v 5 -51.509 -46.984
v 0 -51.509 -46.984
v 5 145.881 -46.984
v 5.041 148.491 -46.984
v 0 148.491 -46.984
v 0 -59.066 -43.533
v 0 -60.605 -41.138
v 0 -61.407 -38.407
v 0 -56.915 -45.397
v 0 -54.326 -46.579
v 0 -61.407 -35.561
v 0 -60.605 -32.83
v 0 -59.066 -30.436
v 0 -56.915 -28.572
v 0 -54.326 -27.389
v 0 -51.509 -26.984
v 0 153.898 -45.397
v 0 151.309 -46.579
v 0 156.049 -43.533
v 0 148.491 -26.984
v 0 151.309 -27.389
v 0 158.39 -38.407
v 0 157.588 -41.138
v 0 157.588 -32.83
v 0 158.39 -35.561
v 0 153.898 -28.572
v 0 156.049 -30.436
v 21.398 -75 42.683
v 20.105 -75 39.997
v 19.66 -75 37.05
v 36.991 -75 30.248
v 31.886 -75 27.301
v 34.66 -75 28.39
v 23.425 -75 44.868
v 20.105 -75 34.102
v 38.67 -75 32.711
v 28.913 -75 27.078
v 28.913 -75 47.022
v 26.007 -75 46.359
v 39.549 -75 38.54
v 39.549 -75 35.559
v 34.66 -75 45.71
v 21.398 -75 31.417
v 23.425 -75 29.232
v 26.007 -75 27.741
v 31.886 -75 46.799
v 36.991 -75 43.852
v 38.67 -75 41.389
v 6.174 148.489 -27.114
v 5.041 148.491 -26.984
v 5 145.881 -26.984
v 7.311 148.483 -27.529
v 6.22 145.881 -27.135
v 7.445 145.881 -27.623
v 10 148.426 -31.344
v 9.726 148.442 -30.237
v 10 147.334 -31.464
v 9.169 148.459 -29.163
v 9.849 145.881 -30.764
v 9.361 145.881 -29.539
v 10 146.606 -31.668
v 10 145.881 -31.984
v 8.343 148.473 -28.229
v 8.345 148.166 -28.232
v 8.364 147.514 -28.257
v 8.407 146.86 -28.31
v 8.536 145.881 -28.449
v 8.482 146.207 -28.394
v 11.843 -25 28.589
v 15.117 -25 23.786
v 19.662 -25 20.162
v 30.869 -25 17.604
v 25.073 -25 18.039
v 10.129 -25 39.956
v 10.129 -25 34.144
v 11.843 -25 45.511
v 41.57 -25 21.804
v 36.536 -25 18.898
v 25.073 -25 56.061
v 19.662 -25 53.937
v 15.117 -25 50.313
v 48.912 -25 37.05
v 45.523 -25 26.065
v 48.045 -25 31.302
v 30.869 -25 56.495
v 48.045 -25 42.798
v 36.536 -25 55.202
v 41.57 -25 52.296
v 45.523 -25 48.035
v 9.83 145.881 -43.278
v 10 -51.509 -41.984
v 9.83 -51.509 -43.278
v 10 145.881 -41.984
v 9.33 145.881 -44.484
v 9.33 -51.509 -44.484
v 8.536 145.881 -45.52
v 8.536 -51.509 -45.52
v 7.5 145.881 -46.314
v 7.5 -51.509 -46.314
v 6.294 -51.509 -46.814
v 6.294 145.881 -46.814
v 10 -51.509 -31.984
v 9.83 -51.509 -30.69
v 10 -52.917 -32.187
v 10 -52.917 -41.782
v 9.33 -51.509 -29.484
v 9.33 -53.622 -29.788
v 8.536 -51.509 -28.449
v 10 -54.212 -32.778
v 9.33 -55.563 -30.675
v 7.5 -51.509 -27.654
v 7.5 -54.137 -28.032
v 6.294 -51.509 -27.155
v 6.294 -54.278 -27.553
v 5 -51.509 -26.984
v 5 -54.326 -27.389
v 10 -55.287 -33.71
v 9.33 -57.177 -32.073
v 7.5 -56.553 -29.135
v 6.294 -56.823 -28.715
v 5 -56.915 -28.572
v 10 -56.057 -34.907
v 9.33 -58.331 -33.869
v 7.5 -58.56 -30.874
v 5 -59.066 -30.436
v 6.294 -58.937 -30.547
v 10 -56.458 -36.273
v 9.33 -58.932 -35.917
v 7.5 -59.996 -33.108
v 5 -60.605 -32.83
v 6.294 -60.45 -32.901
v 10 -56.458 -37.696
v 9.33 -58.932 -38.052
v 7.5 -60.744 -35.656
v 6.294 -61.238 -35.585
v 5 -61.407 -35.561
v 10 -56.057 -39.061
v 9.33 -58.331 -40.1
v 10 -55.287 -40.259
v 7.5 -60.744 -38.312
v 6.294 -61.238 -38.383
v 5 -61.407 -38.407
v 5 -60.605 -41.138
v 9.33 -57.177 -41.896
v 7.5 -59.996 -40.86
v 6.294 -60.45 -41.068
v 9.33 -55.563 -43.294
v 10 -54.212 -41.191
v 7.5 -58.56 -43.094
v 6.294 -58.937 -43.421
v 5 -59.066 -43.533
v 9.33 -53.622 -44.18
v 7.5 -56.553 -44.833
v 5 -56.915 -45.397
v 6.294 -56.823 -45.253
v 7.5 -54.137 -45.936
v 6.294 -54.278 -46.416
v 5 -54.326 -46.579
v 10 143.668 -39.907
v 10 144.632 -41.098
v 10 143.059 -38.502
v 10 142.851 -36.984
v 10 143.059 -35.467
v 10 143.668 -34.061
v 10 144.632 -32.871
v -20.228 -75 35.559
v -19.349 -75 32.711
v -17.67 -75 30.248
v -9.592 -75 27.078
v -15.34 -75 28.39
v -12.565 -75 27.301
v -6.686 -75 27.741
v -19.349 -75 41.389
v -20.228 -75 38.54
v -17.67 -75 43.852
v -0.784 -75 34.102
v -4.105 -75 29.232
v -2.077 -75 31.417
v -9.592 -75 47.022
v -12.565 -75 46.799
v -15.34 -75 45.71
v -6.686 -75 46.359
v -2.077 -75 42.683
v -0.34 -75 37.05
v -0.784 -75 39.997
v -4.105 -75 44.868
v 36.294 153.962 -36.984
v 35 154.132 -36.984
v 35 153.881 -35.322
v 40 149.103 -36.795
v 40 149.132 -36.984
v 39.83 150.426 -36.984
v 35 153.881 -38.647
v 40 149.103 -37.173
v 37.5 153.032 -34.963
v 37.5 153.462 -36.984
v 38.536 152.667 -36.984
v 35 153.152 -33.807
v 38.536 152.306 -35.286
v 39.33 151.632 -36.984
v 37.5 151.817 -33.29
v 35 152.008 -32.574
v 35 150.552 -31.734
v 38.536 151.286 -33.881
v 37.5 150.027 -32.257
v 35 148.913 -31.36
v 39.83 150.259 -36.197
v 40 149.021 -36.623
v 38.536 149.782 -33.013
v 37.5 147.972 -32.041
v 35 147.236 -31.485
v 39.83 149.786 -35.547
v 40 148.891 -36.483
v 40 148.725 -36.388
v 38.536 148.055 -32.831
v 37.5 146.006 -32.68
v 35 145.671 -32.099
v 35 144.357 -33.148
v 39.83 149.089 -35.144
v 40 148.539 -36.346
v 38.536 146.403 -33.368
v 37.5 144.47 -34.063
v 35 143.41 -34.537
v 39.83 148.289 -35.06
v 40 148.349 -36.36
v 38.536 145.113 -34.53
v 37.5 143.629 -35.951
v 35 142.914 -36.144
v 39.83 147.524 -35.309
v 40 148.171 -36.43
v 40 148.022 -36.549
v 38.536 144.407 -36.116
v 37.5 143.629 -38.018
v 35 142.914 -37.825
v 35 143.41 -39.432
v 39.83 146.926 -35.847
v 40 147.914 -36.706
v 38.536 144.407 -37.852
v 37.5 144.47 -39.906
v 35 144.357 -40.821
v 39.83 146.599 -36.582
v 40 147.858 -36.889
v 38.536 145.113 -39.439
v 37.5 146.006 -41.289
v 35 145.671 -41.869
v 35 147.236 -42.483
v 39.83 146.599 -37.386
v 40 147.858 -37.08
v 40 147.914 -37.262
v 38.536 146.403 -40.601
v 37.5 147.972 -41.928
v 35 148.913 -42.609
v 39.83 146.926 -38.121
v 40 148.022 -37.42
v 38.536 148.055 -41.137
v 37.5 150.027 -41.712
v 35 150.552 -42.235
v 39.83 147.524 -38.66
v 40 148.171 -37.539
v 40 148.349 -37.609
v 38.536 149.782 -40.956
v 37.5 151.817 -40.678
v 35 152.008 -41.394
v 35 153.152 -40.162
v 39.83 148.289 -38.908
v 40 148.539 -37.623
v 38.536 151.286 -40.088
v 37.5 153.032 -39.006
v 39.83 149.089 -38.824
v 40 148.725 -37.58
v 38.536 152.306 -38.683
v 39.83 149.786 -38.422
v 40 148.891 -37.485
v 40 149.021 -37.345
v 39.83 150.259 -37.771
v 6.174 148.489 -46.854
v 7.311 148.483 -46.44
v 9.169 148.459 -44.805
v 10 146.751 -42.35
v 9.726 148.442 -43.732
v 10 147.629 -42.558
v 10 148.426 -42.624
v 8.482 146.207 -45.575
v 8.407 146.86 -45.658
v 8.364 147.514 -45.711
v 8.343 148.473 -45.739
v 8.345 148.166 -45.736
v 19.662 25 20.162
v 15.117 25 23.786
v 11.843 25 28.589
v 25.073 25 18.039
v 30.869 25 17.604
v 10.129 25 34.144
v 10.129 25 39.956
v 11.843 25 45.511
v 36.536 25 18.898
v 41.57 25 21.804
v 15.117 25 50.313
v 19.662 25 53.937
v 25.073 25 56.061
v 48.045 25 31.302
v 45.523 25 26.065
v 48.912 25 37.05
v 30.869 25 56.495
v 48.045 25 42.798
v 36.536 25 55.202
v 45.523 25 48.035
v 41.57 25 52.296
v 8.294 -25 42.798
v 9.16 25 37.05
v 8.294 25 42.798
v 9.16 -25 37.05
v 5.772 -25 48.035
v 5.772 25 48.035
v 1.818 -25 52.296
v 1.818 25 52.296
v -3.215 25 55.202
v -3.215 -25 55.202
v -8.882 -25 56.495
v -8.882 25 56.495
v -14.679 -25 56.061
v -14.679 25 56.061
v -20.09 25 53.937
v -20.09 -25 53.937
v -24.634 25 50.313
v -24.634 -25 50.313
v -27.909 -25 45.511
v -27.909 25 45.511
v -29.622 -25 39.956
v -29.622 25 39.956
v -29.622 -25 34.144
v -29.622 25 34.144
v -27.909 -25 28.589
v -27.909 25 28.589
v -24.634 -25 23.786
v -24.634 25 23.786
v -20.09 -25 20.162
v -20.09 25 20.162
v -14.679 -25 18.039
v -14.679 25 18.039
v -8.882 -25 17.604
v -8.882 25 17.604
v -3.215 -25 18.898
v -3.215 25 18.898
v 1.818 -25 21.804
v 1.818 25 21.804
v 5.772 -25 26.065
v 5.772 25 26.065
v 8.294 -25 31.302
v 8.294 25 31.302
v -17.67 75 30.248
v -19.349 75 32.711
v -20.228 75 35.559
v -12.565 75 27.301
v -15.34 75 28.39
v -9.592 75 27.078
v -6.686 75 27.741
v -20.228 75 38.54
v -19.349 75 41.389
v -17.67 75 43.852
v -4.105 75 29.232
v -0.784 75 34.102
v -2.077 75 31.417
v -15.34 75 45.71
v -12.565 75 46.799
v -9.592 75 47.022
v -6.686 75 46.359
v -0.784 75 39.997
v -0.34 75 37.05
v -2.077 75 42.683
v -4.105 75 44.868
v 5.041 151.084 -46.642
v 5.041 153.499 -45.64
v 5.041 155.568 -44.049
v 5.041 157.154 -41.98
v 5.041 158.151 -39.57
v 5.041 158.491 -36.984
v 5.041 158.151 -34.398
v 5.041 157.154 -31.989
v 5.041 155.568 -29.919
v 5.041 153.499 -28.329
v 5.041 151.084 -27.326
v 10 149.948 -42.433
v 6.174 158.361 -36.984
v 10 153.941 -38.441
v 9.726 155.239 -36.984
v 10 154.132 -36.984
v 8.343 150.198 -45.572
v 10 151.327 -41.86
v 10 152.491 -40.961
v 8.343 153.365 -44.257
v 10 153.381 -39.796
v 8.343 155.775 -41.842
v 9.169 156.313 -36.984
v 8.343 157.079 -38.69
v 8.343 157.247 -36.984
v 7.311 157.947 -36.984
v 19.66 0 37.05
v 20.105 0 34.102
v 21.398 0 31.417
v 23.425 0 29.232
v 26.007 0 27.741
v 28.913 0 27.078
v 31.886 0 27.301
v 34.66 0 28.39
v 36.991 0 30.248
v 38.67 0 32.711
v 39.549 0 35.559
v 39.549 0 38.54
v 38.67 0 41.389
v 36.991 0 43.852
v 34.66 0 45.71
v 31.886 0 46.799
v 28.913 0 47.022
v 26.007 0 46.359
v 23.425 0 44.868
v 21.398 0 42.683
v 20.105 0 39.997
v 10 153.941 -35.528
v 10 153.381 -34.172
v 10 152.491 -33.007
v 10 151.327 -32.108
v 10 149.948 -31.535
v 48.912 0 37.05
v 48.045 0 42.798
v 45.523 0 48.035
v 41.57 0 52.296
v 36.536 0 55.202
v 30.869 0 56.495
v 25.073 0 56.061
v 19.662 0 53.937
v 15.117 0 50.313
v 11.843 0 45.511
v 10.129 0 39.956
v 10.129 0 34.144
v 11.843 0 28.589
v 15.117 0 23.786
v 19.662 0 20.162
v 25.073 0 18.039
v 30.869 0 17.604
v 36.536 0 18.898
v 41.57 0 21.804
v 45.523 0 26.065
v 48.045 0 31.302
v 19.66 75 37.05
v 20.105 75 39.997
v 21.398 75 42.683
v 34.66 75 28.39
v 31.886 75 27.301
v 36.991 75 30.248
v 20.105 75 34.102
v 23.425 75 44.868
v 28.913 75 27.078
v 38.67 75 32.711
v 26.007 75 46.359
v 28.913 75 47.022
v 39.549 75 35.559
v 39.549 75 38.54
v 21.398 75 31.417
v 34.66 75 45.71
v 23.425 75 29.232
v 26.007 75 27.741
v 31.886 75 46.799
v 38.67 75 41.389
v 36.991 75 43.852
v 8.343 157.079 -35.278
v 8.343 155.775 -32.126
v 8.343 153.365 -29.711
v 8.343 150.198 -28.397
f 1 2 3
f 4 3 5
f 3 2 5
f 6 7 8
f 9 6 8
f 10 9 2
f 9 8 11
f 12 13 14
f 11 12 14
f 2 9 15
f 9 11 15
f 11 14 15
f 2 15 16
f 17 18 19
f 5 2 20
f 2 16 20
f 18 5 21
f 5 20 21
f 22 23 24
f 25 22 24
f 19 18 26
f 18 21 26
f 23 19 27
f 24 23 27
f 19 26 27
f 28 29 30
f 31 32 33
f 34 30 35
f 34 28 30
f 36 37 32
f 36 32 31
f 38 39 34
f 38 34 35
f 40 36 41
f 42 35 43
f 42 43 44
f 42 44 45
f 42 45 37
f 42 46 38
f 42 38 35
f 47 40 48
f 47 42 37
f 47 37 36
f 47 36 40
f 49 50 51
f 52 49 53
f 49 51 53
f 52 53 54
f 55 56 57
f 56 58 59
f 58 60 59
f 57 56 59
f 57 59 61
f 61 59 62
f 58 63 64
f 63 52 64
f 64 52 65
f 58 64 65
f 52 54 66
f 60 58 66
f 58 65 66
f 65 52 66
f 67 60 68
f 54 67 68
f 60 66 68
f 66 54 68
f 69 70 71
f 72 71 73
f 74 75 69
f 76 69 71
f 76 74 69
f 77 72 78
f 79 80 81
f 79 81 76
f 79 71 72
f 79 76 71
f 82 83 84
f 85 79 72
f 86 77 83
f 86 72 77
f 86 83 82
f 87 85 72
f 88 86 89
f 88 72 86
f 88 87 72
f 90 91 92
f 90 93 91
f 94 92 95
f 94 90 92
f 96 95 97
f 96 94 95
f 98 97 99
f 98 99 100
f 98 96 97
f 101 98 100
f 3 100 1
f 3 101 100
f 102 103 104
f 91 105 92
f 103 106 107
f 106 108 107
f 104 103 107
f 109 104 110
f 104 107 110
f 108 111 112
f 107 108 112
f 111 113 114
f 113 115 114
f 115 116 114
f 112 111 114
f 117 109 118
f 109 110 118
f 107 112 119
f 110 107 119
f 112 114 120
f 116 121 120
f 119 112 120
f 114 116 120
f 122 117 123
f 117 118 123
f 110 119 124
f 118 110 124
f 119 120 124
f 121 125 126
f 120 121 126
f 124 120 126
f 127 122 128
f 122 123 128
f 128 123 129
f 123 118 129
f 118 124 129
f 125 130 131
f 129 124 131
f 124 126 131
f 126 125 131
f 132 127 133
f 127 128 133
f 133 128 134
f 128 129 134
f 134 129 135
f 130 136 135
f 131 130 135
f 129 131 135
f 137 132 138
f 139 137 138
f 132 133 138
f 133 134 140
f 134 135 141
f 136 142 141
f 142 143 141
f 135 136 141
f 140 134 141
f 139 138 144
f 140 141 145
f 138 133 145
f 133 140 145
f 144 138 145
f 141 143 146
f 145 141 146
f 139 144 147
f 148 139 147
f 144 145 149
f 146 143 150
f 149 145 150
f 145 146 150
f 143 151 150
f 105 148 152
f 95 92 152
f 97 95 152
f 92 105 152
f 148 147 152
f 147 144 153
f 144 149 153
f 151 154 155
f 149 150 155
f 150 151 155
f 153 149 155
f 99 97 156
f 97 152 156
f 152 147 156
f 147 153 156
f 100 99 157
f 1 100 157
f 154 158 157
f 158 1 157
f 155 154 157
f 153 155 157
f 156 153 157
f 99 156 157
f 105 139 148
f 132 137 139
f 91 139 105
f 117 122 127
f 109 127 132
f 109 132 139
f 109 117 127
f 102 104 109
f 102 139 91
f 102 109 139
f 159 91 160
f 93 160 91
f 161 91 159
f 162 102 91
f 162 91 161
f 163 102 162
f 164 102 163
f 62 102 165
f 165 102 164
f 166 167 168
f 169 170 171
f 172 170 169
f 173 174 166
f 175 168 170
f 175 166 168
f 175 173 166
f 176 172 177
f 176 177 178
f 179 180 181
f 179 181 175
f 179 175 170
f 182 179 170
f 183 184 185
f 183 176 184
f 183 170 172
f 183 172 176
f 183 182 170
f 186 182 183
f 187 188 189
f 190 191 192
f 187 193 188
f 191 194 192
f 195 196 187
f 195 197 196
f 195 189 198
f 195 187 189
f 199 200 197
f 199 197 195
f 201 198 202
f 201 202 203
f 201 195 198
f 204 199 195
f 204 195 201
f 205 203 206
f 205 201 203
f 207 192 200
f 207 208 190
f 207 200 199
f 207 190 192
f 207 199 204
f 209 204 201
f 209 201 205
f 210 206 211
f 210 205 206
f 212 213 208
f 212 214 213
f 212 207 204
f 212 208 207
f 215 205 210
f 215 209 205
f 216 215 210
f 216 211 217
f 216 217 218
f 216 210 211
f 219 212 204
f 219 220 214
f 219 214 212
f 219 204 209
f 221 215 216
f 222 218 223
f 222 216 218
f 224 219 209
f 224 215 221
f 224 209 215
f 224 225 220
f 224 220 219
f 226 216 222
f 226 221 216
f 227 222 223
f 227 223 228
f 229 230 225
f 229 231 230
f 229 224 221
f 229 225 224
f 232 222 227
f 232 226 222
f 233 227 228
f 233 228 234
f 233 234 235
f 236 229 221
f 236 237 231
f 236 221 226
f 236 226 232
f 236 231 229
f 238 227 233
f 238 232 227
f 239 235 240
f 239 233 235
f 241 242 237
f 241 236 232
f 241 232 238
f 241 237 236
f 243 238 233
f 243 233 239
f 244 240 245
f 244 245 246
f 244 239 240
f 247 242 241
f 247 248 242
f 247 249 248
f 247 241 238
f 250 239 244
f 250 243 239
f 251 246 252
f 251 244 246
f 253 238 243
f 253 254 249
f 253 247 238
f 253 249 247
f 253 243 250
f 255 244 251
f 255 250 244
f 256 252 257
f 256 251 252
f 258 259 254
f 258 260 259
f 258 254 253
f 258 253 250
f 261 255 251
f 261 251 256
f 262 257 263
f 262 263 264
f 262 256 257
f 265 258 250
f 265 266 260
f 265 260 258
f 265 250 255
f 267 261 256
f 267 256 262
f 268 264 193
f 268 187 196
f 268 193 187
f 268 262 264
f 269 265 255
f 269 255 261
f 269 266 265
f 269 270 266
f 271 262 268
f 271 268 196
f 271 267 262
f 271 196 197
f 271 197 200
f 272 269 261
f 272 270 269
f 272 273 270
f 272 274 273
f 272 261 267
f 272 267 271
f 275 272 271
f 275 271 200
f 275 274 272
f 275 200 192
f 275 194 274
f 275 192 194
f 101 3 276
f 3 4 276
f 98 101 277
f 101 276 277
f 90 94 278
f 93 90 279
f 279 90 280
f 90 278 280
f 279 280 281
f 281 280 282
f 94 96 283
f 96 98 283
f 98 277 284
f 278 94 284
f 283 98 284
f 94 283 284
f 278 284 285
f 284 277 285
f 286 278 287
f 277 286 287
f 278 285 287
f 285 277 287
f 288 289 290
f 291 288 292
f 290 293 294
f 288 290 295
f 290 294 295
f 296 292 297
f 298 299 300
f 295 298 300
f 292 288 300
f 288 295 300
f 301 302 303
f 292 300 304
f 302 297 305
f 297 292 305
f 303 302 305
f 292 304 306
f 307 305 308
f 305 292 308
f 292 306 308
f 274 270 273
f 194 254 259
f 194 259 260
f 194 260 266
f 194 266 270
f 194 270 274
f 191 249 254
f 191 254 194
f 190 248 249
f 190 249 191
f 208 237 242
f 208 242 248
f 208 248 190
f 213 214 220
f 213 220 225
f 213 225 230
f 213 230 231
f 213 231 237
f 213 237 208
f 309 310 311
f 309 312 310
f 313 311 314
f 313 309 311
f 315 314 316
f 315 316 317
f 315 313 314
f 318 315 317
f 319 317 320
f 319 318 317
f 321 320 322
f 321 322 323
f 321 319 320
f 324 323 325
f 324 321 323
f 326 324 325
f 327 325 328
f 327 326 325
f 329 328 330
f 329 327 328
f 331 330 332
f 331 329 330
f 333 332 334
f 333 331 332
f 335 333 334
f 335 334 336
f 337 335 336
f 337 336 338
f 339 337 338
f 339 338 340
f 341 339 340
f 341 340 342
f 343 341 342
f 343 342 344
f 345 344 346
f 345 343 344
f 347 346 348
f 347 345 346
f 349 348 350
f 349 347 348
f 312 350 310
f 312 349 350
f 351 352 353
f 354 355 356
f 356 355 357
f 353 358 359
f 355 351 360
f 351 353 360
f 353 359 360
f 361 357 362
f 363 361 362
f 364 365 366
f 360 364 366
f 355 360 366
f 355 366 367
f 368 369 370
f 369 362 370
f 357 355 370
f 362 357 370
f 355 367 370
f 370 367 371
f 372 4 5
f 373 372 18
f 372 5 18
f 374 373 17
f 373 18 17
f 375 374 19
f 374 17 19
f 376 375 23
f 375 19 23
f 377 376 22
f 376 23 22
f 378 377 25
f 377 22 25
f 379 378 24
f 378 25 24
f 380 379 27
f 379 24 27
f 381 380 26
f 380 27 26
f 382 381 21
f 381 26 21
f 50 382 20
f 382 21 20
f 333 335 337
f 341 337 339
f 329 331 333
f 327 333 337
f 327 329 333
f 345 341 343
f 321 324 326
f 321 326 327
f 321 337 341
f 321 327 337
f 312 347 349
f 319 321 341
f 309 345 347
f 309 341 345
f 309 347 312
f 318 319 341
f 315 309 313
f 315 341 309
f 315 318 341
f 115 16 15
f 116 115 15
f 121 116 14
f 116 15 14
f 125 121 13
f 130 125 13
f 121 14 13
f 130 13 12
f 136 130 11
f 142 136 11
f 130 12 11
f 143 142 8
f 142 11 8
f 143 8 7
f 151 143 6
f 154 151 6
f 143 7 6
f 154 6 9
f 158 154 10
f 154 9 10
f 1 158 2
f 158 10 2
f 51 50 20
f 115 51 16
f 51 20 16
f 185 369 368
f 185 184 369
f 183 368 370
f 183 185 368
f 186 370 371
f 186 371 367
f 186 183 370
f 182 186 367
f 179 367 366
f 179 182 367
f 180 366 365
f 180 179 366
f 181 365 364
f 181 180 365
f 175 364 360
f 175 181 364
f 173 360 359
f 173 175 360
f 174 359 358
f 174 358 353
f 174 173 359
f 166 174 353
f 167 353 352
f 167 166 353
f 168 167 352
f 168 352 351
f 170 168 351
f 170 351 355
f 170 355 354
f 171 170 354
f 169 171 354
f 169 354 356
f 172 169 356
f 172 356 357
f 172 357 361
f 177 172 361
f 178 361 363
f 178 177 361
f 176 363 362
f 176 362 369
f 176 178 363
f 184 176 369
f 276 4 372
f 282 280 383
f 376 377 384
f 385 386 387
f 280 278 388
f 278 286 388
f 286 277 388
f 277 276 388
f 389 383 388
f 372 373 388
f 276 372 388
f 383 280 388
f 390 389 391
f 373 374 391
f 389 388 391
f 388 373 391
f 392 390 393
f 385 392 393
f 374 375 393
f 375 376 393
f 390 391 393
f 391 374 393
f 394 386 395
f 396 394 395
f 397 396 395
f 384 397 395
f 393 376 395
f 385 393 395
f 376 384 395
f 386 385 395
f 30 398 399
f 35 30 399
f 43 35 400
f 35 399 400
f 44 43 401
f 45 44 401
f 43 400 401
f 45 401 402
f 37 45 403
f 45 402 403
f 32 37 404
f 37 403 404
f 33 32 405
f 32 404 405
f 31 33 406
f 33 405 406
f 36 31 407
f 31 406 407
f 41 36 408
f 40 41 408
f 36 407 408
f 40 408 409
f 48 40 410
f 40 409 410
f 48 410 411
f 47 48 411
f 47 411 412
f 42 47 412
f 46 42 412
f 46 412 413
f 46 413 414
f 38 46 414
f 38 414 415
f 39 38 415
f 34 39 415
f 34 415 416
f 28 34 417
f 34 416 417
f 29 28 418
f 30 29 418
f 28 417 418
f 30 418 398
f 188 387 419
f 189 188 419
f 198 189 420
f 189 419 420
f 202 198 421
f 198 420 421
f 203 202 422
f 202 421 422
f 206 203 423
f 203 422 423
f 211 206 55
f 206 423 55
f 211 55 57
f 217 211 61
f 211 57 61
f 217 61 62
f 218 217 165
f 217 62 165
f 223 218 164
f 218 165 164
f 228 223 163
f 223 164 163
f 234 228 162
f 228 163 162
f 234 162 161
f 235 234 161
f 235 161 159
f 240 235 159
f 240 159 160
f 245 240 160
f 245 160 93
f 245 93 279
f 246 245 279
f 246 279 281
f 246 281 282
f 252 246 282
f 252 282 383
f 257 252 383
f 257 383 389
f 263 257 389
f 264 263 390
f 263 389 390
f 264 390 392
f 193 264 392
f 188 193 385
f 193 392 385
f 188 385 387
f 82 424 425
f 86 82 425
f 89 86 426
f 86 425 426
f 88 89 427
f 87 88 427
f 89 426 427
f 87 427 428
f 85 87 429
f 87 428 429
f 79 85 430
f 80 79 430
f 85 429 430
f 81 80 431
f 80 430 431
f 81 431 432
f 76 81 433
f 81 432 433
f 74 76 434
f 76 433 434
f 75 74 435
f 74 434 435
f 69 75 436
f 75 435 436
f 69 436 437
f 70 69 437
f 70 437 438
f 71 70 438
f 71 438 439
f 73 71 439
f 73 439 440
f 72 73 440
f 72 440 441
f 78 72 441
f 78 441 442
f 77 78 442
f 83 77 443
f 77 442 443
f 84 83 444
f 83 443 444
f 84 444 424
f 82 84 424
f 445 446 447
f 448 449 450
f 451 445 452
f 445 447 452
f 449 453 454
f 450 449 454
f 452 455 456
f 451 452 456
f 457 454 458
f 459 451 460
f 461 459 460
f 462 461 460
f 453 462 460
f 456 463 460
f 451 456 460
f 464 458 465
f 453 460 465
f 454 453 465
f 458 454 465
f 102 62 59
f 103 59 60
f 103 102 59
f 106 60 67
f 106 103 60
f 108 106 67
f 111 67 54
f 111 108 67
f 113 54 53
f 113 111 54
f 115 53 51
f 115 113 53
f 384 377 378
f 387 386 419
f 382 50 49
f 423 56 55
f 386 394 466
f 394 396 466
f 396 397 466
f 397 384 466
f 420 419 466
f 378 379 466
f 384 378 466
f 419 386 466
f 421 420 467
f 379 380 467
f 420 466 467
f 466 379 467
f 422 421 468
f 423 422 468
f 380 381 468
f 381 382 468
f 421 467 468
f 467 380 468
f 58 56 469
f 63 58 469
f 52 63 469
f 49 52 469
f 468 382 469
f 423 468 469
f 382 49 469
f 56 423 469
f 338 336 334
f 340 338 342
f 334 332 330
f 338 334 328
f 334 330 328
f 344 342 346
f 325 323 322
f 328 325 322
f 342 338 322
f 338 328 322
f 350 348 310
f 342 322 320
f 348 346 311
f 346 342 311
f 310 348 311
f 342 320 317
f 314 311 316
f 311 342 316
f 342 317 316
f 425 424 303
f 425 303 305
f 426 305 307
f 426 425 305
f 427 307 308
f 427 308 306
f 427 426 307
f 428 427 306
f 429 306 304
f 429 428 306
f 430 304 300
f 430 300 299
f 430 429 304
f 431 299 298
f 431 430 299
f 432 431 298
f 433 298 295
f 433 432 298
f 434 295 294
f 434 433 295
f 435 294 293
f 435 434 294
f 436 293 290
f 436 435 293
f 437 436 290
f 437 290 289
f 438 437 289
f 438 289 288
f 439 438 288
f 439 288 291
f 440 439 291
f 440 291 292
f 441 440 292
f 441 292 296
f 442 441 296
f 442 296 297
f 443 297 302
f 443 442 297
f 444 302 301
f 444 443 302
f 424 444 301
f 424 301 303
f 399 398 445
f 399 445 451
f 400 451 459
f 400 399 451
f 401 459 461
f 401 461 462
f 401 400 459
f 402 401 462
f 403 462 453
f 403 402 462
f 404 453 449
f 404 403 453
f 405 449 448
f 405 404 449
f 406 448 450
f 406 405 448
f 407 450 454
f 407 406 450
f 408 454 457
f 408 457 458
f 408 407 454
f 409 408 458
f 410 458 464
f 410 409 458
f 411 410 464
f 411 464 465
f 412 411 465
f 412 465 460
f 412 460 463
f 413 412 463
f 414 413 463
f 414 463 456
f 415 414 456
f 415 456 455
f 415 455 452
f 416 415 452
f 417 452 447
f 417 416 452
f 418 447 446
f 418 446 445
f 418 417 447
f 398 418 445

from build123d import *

# Parameters (mm, degrees)
F1_DEPTH = 75
F2_R     = 19.5
F3_DEPTH = 25
F4_R     = 5.640511
F5_DEPTH = 40
F6_DEPTH = 10
F7_R     = 5


with BuildPart() as f1:
    # F0 (on Front) → F1 (new body, symmetric)
    with BuildSketch(Plane.XZ):
        with BuildLine():
            Line((19.66037, 37.049837), (39.66037, 37.049837))
            ThreePointArc((39.66037, 37.049837), (29.66037, 47.049837), (19.66037, 37.049837))
        make_face()
        with BuildLine():
            ThreePointArc((-20.33963, 37.049837), (-10.33963, 27.049837), (-0.33963, 37.049837))
            Line((-0.33963, 37.049837), (-20.33963, 37.049837))
        make_face()
        with BuildLine():
            Line((-20.33963, 37.049837), (-0.33963, 37.049837))
            ThreePointArc((-0.33963, 37.049837), (-10.33963, 47.049837), (-20.33963, 37.049837))
        make_face()
        with BuildLine():
            ThreePointArc((19.66037, 37.049837), (29.66037, 27.049837), (39.66037, 37.049837))
            Line((39.66037, 37.049837), (19.66037, 37.049837))
        make_face()
    extrude(amount=F1_DEPTH, both=True)


with BuildPart() as f3:
    # F2 (on Front) → F3 (new body, symmetric)
    with BuildSketch(Plane.XZ):
        with Locations((29.41169, 37.049837)):
            Circle(F2_R)
        with Locations((-10.33963, 37.049837)):
            Circle(F2_R)
    extrude(amount=F3_DEPTH, both=True)


with BuildPart() as f5:
    # F4 (on Right) → F5 (new body)
    with BuildSketch(Plane.YZ):
        with Locations((148.491439, -36.984242)):
            Circle(F4_R)
    extrude(amount=F5_DEPTH)

    # F4 (on Right) → F6 (join)
    with BuildSketch(Plane.YZ):
        with BuildLine():
            Line((148.491439, -26.984242), (-51.508561, -26.984242))
            ThreePointArc((-51.508561, -26.984242), (-44.437493, -29.913174), (-41.508561, -36.984242))
            ThreePointArc((-41.508561, -36.984242), (-44.437493, -44.055309), (-51.508561, -46.984242))
            Line((-51.508561, -46.984242), (148.491439, -46.984242))
            ThreePointArc((148.491439, -46.984242), (158.491439, -36.984242), (148.491439, -26.984242))
        make_face()
        with Locations((148.491439, -36.984242)):
            Circle(F4_R, mode=Mode.SUBTRACT)
        with BuildLine():
            ThreePointArc((-41.508561, -36.984242), (-44.437493, -29.913174), (-51.508561, -26.984242))
            ThreePointArc((-51.508561, -26.984242), (-61.508561, -36.984242), (-51.508561, -46.984242))
            ThreePointArc((-51.508561, -46.984242), (-44.437493, -44.055309), (-41.508561, -36.984242))
        make_face()
    extrude(amount=F6_DEPTH)

    # F7
    f7_edges = [f5.edges().sort_by_distance(p)[0] for p in [
        (10, 48.491439, -46.984242),
        (40, 142.850928, -36.984242),
    ]]
    fillet(f7_edges, radius=F7_R)


solid = Compound([f1.part, f3.part, f5.part])
